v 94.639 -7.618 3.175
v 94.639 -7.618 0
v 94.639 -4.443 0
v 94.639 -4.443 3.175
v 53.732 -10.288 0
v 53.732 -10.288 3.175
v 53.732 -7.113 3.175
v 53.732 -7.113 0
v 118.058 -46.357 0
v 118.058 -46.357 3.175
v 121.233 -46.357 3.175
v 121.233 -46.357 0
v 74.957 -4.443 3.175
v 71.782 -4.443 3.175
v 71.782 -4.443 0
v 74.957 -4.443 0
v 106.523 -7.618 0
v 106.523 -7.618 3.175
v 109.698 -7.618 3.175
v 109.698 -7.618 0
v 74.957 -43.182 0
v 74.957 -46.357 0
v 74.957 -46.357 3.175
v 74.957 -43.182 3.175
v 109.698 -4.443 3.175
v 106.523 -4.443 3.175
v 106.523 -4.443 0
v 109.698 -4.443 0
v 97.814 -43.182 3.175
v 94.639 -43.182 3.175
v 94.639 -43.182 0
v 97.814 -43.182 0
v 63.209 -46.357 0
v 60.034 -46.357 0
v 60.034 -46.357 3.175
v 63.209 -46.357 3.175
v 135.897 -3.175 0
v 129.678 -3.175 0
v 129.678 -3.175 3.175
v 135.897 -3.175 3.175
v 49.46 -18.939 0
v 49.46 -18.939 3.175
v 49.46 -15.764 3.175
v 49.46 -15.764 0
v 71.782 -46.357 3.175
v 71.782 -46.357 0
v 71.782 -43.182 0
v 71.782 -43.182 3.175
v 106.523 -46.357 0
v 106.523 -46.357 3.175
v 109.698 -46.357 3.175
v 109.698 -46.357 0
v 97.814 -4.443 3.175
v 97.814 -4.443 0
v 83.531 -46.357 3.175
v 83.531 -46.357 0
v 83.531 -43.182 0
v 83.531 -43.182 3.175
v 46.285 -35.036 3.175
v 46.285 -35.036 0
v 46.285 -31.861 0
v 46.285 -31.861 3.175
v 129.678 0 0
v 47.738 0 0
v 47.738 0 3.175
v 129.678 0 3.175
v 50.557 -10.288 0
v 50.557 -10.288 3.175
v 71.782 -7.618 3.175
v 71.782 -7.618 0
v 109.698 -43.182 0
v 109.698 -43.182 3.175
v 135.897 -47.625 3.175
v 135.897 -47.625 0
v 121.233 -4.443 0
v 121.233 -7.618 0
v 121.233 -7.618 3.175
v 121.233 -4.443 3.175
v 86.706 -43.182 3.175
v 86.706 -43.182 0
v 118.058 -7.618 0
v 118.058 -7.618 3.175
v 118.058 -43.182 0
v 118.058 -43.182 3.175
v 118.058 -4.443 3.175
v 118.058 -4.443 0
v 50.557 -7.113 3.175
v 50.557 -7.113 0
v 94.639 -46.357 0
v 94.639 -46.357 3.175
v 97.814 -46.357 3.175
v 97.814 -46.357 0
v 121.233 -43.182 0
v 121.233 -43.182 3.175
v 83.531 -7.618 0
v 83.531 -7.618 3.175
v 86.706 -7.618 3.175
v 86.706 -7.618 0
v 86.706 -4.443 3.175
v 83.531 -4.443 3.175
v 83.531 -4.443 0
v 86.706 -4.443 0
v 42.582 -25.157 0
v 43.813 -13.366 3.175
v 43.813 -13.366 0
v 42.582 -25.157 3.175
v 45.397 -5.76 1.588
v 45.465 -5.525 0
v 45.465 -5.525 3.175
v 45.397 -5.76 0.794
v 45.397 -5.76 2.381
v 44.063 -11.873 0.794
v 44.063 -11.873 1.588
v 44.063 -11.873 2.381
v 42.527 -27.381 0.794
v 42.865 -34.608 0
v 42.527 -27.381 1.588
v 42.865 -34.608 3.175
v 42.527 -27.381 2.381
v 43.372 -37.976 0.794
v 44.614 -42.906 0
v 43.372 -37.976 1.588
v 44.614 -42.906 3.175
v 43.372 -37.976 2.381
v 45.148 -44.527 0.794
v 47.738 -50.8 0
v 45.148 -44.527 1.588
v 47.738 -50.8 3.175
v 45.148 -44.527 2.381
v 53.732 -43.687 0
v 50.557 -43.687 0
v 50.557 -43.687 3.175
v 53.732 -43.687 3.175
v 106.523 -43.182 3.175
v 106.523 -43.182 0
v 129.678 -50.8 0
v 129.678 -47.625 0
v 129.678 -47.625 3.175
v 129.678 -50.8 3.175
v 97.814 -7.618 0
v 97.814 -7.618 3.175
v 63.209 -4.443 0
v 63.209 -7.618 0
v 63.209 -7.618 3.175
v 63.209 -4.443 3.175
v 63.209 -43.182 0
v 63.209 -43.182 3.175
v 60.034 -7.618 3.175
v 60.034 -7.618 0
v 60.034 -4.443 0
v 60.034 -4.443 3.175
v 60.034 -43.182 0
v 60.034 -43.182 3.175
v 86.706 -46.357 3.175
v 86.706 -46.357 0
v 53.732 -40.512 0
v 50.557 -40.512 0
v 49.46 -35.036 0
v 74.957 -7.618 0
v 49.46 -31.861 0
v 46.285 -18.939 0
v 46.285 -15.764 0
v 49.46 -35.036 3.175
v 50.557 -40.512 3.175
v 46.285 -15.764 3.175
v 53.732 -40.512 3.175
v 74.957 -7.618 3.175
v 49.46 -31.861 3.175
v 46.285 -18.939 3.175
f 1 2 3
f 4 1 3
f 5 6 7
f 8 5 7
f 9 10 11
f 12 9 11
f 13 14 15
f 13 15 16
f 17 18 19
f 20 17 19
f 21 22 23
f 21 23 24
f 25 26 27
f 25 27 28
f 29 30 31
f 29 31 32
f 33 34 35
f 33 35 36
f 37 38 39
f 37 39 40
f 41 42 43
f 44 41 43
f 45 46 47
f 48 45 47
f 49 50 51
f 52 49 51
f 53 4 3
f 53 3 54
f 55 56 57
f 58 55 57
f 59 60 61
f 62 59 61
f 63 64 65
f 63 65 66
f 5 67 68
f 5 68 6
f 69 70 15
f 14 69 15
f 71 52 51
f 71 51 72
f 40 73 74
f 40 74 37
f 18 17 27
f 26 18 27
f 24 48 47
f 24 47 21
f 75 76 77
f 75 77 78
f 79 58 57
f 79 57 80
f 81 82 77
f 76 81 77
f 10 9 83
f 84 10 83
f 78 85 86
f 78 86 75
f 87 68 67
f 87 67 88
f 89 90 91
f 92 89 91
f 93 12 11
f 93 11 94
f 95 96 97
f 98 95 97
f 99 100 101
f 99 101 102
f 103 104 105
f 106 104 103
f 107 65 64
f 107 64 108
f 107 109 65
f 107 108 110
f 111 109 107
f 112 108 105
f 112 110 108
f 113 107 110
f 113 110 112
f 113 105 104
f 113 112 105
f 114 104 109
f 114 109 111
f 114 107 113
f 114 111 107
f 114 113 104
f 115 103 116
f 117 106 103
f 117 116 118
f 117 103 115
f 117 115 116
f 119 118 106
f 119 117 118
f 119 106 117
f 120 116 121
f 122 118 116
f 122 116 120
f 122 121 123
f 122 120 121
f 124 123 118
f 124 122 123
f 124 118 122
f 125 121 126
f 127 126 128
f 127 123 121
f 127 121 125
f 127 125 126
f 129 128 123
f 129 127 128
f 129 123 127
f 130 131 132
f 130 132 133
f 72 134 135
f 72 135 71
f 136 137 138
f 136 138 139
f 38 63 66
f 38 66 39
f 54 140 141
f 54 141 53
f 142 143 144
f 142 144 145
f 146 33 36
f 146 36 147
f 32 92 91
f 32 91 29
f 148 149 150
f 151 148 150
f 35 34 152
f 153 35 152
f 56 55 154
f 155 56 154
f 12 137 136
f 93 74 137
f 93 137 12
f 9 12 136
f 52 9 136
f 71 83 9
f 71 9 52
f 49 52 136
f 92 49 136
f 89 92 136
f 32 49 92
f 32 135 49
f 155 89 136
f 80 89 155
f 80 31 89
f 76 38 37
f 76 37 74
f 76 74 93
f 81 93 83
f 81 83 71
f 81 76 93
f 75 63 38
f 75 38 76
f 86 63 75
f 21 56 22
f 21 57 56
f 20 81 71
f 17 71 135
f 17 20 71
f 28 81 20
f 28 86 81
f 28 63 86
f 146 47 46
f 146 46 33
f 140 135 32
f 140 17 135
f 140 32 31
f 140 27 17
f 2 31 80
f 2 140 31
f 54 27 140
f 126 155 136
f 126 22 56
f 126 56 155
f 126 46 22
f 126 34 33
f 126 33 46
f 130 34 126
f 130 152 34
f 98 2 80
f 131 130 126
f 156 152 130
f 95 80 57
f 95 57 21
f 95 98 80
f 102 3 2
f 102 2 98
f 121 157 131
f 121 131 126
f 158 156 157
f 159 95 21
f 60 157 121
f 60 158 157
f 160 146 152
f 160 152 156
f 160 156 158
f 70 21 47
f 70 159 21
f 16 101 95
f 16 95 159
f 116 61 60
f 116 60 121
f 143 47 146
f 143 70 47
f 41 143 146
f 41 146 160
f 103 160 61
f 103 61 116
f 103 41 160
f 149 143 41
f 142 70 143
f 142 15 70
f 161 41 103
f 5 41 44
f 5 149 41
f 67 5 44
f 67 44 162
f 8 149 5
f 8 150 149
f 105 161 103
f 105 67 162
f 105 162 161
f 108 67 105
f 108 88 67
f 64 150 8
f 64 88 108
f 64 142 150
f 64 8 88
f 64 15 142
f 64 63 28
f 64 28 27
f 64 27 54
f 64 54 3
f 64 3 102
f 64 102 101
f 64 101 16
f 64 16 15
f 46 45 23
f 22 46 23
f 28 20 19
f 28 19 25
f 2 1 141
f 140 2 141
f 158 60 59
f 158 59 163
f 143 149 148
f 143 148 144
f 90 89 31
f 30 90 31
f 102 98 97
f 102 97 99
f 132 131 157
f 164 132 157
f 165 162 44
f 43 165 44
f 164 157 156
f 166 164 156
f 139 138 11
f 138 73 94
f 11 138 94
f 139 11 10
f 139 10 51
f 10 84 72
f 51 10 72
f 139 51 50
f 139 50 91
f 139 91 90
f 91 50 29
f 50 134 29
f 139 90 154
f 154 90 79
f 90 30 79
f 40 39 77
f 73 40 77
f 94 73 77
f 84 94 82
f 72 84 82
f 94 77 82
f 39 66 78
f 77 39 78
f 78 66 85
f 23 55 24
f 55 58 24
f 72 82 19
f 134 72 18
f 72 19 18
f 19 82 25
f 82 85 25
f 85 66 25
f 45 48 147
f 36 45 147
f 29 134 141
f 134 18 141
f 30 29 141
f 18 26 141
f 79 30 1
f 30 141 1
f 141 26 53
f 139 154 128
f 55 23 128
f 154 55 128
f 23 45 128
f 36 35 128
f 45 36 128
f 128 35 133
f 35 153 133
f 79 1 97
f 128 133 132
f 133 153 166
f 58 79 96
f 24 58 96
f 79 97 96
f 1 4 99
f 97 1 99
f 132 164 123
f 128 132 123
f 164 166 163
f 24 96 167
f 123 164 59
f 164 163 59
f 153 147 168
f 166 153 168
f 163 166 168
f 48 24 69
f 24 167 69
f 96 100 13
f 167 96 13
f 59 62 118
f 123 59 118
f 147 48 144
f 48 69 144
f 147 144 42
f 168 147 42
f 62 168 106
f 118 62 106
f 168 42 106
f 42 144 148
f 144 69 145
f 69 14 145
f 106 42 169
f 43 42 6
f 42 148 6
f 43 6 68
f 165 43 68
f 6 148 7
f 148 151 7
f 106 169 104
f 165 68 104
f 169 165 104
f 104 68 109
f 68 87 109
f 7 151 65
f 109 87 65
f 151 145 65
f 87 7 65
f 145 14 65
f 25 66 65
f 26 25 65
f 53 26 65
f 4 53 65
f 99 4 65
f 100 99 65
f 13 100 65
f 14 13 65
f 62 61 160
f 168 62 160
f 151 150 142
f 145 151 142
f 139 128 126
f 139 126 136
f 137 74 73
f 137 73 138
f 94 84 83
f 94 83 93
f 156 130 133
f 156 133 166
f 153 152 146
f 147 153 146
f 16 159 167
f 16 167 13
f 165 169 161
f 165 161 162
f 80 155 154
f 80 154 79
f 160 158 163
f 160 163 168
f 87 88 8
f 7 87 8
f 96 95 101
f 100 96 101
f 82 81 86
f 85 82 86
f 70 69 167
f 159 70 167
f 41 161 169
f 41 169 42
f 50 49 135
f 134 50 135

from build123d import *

# Parameters (mm, degrees)
BOSS_EXTRUDE1_DEPTH = 3.175
CUT_EXTRUDE1_DEPTH  = 3.175
SKETCH3_W           = 3.175
SKETCH3_H           = 3.175
CUT_EXTRUDE2_DEPTH  = 3.175
SKETCH4_W           = 9.525
SKETCH4_H           = 44.45
CUT_EXTRUDE3_DEPTH  = 3.175
CUT_EXTRUDE4_DEPTH  = 3.175


with BuildPart() as part:
    # Sketch1 → Boss-Extrude1 (new body)
    with BuildSketch(Plane.XY):
        with BuildLine():
            Line((47.738161277, 0), (129.678020066, 0))
            Line((129.678020066, 0), (129.678020066, -3.175))
            Line((129.678020066, -3.175), (145.421593995, -3.175))
            Line((145.421593995, -3.175), (145.421593995, -47.625))
            Line((145.421593995, -47.625), (129.678020066, -47.625))
            Line((129.678020066, -47.625), (129.678020066, -51.488987453))
            Line((129.678020066, -51.488987453), (47.738161277, -50.8))
            add(Edge.make_bspline(
                [(47.738161277, 0), (41.393133439, -1.711069928), (30.530442831, -9.367517151), (28.681444031, -25.622801065), (30.401296487, -42.131760993), (41.721917061, -48.493240739), (47.738161277, -50.8)],
                knots=[0, 0, 0, 0, 0.298782405, 0.512668788, 0.698134952, 1, 1, 1, 1], degree=3))
        make_face()
    extrude(amount=BOSS_EXTRUDE1_DEPTH)

    # Sketch2 → Cut-Extrude1 (cut)
    with BuildSketch(Plane.XY.offset(3.175)):
        with BuildLine():
            Line((47.738161277, 0), (25.94415126, 0))
            Line((25.94415126, 0), (25.94415126, -50.8))
            Line((25.94415126, -50.8), (47.738161277, -50.8))
            add(Edge.make_bspline(
                [(47.738161277, 0), (45.681525529, -3.647242432), (43.645083007, -12.887655636), (42.176101449, -25.699616702), (42.981732395, -39.048066027), (45.802728015, -46.725242417), (47.738161277, -50.8)],
                knots=[0, 0, 0, 0, 0.238683845, 0.536924902, 0.740325465, 1, 1, 1, 1], degree=3))
        make_face()
    extrude(amount=-CUT_EXTRUDE1_DEPTH, mode=Mode.SUBTRACT)

    # Sketch3 → Cut-Extrude2 (cut)
    with BuildSketch(Plane.XY.offset(3.175)):
        with Locations((61.621228186, -6.030517165)):
            Rectangle(SKETCH3_W, SKETCH3_H)
        with Locations((73.369830924, -6.030517165)):
            Rectangle(SKETCH3_W, SKETCH3_H)
        with Locations((85.118433661, -6.030517165)):
            Rectangle(SKETCH3_W, SKETCH3_H)
        with Locations((96.226203523, -6.030517165)):
            Rectangle(SKETCH3_W, SKETCH3_H)
        with Locations((108.110776123, -6.030517165)):
            Rectangle(SKETCH3_W, SKETCH3_H)
        with Locations((119.645767902, -6.030517165)):
            Rectangle(SKETCH3_W, SKETCH3_H)
        with Locations((52.144704899, -8.700654151)):
            Rectangle(SKETCH3_W, SKETCH3_H)
        with Locations((47.872485722, -17.351897985)):
            Rectangle(SKETCH3_W, SKETCH3_H)
        with Locations((47.872485722, -33.448102015)):
            Rectangle(SKETCH3_W, SKETCH3_H)
        with Locations((52.144704899, -42.099345849)):
            Rectangle(SKETCH3_W, SKETCH3_H)
        with Locations((61.621228186, -44.769482835)):
            Rectangle(SKETCH3_W, SKETCH3_H)
        with Locations((73.369830924, -44.769482835)):
            Rectangle(SKETCH3_W, SKETCH3_H)
        with Locations((85.118433661, -44.769482835)):
            Rectangle(SKETCH3_W, SKETCH3_H)
        with Locations((96.226203523, -44.769482835)):
            Rectangle(SKETCH3_W, SKETCH3_H)
        with Locations((108.110776123, -44.769482835)):
            Rectangle(SKETCH3_W, SKETCH3_H)
        with Locations((119.645767902, -44.769482835)):
            Rectangle(SKETCH3_W, SKETCH3_H)
    extrude(amount=-CUT_EXTRUDE2_DEPTH, mode=Mode.SUBTRACT)

    # Sketch4 → Cut-Extrude3 (cut)
    with BuildSketch(Plane.XY.offset(3.175)):
        with Locations((140.659093995, -25.4)):
            Rectangle(SKETCH4_W, SKETCH4_H)
    extrude(amount=-CUT_EXTRUDE3_DEPTH, mode=Mode.SUBTRACT)

    # Sketch5 → Cut-Extrude4 (cut)
    with BuildSketch(Plane.XY.offset(3.175)):
        Polygon((131.864975324, -55.496835694), (47.738161277, -50.8), (131.864975324, -50.8), align=None)
    extrude(amount=-CUT_EXTRUDE4_DEPTH, mode=Mode.SUBTRACT)


solid = part.part
